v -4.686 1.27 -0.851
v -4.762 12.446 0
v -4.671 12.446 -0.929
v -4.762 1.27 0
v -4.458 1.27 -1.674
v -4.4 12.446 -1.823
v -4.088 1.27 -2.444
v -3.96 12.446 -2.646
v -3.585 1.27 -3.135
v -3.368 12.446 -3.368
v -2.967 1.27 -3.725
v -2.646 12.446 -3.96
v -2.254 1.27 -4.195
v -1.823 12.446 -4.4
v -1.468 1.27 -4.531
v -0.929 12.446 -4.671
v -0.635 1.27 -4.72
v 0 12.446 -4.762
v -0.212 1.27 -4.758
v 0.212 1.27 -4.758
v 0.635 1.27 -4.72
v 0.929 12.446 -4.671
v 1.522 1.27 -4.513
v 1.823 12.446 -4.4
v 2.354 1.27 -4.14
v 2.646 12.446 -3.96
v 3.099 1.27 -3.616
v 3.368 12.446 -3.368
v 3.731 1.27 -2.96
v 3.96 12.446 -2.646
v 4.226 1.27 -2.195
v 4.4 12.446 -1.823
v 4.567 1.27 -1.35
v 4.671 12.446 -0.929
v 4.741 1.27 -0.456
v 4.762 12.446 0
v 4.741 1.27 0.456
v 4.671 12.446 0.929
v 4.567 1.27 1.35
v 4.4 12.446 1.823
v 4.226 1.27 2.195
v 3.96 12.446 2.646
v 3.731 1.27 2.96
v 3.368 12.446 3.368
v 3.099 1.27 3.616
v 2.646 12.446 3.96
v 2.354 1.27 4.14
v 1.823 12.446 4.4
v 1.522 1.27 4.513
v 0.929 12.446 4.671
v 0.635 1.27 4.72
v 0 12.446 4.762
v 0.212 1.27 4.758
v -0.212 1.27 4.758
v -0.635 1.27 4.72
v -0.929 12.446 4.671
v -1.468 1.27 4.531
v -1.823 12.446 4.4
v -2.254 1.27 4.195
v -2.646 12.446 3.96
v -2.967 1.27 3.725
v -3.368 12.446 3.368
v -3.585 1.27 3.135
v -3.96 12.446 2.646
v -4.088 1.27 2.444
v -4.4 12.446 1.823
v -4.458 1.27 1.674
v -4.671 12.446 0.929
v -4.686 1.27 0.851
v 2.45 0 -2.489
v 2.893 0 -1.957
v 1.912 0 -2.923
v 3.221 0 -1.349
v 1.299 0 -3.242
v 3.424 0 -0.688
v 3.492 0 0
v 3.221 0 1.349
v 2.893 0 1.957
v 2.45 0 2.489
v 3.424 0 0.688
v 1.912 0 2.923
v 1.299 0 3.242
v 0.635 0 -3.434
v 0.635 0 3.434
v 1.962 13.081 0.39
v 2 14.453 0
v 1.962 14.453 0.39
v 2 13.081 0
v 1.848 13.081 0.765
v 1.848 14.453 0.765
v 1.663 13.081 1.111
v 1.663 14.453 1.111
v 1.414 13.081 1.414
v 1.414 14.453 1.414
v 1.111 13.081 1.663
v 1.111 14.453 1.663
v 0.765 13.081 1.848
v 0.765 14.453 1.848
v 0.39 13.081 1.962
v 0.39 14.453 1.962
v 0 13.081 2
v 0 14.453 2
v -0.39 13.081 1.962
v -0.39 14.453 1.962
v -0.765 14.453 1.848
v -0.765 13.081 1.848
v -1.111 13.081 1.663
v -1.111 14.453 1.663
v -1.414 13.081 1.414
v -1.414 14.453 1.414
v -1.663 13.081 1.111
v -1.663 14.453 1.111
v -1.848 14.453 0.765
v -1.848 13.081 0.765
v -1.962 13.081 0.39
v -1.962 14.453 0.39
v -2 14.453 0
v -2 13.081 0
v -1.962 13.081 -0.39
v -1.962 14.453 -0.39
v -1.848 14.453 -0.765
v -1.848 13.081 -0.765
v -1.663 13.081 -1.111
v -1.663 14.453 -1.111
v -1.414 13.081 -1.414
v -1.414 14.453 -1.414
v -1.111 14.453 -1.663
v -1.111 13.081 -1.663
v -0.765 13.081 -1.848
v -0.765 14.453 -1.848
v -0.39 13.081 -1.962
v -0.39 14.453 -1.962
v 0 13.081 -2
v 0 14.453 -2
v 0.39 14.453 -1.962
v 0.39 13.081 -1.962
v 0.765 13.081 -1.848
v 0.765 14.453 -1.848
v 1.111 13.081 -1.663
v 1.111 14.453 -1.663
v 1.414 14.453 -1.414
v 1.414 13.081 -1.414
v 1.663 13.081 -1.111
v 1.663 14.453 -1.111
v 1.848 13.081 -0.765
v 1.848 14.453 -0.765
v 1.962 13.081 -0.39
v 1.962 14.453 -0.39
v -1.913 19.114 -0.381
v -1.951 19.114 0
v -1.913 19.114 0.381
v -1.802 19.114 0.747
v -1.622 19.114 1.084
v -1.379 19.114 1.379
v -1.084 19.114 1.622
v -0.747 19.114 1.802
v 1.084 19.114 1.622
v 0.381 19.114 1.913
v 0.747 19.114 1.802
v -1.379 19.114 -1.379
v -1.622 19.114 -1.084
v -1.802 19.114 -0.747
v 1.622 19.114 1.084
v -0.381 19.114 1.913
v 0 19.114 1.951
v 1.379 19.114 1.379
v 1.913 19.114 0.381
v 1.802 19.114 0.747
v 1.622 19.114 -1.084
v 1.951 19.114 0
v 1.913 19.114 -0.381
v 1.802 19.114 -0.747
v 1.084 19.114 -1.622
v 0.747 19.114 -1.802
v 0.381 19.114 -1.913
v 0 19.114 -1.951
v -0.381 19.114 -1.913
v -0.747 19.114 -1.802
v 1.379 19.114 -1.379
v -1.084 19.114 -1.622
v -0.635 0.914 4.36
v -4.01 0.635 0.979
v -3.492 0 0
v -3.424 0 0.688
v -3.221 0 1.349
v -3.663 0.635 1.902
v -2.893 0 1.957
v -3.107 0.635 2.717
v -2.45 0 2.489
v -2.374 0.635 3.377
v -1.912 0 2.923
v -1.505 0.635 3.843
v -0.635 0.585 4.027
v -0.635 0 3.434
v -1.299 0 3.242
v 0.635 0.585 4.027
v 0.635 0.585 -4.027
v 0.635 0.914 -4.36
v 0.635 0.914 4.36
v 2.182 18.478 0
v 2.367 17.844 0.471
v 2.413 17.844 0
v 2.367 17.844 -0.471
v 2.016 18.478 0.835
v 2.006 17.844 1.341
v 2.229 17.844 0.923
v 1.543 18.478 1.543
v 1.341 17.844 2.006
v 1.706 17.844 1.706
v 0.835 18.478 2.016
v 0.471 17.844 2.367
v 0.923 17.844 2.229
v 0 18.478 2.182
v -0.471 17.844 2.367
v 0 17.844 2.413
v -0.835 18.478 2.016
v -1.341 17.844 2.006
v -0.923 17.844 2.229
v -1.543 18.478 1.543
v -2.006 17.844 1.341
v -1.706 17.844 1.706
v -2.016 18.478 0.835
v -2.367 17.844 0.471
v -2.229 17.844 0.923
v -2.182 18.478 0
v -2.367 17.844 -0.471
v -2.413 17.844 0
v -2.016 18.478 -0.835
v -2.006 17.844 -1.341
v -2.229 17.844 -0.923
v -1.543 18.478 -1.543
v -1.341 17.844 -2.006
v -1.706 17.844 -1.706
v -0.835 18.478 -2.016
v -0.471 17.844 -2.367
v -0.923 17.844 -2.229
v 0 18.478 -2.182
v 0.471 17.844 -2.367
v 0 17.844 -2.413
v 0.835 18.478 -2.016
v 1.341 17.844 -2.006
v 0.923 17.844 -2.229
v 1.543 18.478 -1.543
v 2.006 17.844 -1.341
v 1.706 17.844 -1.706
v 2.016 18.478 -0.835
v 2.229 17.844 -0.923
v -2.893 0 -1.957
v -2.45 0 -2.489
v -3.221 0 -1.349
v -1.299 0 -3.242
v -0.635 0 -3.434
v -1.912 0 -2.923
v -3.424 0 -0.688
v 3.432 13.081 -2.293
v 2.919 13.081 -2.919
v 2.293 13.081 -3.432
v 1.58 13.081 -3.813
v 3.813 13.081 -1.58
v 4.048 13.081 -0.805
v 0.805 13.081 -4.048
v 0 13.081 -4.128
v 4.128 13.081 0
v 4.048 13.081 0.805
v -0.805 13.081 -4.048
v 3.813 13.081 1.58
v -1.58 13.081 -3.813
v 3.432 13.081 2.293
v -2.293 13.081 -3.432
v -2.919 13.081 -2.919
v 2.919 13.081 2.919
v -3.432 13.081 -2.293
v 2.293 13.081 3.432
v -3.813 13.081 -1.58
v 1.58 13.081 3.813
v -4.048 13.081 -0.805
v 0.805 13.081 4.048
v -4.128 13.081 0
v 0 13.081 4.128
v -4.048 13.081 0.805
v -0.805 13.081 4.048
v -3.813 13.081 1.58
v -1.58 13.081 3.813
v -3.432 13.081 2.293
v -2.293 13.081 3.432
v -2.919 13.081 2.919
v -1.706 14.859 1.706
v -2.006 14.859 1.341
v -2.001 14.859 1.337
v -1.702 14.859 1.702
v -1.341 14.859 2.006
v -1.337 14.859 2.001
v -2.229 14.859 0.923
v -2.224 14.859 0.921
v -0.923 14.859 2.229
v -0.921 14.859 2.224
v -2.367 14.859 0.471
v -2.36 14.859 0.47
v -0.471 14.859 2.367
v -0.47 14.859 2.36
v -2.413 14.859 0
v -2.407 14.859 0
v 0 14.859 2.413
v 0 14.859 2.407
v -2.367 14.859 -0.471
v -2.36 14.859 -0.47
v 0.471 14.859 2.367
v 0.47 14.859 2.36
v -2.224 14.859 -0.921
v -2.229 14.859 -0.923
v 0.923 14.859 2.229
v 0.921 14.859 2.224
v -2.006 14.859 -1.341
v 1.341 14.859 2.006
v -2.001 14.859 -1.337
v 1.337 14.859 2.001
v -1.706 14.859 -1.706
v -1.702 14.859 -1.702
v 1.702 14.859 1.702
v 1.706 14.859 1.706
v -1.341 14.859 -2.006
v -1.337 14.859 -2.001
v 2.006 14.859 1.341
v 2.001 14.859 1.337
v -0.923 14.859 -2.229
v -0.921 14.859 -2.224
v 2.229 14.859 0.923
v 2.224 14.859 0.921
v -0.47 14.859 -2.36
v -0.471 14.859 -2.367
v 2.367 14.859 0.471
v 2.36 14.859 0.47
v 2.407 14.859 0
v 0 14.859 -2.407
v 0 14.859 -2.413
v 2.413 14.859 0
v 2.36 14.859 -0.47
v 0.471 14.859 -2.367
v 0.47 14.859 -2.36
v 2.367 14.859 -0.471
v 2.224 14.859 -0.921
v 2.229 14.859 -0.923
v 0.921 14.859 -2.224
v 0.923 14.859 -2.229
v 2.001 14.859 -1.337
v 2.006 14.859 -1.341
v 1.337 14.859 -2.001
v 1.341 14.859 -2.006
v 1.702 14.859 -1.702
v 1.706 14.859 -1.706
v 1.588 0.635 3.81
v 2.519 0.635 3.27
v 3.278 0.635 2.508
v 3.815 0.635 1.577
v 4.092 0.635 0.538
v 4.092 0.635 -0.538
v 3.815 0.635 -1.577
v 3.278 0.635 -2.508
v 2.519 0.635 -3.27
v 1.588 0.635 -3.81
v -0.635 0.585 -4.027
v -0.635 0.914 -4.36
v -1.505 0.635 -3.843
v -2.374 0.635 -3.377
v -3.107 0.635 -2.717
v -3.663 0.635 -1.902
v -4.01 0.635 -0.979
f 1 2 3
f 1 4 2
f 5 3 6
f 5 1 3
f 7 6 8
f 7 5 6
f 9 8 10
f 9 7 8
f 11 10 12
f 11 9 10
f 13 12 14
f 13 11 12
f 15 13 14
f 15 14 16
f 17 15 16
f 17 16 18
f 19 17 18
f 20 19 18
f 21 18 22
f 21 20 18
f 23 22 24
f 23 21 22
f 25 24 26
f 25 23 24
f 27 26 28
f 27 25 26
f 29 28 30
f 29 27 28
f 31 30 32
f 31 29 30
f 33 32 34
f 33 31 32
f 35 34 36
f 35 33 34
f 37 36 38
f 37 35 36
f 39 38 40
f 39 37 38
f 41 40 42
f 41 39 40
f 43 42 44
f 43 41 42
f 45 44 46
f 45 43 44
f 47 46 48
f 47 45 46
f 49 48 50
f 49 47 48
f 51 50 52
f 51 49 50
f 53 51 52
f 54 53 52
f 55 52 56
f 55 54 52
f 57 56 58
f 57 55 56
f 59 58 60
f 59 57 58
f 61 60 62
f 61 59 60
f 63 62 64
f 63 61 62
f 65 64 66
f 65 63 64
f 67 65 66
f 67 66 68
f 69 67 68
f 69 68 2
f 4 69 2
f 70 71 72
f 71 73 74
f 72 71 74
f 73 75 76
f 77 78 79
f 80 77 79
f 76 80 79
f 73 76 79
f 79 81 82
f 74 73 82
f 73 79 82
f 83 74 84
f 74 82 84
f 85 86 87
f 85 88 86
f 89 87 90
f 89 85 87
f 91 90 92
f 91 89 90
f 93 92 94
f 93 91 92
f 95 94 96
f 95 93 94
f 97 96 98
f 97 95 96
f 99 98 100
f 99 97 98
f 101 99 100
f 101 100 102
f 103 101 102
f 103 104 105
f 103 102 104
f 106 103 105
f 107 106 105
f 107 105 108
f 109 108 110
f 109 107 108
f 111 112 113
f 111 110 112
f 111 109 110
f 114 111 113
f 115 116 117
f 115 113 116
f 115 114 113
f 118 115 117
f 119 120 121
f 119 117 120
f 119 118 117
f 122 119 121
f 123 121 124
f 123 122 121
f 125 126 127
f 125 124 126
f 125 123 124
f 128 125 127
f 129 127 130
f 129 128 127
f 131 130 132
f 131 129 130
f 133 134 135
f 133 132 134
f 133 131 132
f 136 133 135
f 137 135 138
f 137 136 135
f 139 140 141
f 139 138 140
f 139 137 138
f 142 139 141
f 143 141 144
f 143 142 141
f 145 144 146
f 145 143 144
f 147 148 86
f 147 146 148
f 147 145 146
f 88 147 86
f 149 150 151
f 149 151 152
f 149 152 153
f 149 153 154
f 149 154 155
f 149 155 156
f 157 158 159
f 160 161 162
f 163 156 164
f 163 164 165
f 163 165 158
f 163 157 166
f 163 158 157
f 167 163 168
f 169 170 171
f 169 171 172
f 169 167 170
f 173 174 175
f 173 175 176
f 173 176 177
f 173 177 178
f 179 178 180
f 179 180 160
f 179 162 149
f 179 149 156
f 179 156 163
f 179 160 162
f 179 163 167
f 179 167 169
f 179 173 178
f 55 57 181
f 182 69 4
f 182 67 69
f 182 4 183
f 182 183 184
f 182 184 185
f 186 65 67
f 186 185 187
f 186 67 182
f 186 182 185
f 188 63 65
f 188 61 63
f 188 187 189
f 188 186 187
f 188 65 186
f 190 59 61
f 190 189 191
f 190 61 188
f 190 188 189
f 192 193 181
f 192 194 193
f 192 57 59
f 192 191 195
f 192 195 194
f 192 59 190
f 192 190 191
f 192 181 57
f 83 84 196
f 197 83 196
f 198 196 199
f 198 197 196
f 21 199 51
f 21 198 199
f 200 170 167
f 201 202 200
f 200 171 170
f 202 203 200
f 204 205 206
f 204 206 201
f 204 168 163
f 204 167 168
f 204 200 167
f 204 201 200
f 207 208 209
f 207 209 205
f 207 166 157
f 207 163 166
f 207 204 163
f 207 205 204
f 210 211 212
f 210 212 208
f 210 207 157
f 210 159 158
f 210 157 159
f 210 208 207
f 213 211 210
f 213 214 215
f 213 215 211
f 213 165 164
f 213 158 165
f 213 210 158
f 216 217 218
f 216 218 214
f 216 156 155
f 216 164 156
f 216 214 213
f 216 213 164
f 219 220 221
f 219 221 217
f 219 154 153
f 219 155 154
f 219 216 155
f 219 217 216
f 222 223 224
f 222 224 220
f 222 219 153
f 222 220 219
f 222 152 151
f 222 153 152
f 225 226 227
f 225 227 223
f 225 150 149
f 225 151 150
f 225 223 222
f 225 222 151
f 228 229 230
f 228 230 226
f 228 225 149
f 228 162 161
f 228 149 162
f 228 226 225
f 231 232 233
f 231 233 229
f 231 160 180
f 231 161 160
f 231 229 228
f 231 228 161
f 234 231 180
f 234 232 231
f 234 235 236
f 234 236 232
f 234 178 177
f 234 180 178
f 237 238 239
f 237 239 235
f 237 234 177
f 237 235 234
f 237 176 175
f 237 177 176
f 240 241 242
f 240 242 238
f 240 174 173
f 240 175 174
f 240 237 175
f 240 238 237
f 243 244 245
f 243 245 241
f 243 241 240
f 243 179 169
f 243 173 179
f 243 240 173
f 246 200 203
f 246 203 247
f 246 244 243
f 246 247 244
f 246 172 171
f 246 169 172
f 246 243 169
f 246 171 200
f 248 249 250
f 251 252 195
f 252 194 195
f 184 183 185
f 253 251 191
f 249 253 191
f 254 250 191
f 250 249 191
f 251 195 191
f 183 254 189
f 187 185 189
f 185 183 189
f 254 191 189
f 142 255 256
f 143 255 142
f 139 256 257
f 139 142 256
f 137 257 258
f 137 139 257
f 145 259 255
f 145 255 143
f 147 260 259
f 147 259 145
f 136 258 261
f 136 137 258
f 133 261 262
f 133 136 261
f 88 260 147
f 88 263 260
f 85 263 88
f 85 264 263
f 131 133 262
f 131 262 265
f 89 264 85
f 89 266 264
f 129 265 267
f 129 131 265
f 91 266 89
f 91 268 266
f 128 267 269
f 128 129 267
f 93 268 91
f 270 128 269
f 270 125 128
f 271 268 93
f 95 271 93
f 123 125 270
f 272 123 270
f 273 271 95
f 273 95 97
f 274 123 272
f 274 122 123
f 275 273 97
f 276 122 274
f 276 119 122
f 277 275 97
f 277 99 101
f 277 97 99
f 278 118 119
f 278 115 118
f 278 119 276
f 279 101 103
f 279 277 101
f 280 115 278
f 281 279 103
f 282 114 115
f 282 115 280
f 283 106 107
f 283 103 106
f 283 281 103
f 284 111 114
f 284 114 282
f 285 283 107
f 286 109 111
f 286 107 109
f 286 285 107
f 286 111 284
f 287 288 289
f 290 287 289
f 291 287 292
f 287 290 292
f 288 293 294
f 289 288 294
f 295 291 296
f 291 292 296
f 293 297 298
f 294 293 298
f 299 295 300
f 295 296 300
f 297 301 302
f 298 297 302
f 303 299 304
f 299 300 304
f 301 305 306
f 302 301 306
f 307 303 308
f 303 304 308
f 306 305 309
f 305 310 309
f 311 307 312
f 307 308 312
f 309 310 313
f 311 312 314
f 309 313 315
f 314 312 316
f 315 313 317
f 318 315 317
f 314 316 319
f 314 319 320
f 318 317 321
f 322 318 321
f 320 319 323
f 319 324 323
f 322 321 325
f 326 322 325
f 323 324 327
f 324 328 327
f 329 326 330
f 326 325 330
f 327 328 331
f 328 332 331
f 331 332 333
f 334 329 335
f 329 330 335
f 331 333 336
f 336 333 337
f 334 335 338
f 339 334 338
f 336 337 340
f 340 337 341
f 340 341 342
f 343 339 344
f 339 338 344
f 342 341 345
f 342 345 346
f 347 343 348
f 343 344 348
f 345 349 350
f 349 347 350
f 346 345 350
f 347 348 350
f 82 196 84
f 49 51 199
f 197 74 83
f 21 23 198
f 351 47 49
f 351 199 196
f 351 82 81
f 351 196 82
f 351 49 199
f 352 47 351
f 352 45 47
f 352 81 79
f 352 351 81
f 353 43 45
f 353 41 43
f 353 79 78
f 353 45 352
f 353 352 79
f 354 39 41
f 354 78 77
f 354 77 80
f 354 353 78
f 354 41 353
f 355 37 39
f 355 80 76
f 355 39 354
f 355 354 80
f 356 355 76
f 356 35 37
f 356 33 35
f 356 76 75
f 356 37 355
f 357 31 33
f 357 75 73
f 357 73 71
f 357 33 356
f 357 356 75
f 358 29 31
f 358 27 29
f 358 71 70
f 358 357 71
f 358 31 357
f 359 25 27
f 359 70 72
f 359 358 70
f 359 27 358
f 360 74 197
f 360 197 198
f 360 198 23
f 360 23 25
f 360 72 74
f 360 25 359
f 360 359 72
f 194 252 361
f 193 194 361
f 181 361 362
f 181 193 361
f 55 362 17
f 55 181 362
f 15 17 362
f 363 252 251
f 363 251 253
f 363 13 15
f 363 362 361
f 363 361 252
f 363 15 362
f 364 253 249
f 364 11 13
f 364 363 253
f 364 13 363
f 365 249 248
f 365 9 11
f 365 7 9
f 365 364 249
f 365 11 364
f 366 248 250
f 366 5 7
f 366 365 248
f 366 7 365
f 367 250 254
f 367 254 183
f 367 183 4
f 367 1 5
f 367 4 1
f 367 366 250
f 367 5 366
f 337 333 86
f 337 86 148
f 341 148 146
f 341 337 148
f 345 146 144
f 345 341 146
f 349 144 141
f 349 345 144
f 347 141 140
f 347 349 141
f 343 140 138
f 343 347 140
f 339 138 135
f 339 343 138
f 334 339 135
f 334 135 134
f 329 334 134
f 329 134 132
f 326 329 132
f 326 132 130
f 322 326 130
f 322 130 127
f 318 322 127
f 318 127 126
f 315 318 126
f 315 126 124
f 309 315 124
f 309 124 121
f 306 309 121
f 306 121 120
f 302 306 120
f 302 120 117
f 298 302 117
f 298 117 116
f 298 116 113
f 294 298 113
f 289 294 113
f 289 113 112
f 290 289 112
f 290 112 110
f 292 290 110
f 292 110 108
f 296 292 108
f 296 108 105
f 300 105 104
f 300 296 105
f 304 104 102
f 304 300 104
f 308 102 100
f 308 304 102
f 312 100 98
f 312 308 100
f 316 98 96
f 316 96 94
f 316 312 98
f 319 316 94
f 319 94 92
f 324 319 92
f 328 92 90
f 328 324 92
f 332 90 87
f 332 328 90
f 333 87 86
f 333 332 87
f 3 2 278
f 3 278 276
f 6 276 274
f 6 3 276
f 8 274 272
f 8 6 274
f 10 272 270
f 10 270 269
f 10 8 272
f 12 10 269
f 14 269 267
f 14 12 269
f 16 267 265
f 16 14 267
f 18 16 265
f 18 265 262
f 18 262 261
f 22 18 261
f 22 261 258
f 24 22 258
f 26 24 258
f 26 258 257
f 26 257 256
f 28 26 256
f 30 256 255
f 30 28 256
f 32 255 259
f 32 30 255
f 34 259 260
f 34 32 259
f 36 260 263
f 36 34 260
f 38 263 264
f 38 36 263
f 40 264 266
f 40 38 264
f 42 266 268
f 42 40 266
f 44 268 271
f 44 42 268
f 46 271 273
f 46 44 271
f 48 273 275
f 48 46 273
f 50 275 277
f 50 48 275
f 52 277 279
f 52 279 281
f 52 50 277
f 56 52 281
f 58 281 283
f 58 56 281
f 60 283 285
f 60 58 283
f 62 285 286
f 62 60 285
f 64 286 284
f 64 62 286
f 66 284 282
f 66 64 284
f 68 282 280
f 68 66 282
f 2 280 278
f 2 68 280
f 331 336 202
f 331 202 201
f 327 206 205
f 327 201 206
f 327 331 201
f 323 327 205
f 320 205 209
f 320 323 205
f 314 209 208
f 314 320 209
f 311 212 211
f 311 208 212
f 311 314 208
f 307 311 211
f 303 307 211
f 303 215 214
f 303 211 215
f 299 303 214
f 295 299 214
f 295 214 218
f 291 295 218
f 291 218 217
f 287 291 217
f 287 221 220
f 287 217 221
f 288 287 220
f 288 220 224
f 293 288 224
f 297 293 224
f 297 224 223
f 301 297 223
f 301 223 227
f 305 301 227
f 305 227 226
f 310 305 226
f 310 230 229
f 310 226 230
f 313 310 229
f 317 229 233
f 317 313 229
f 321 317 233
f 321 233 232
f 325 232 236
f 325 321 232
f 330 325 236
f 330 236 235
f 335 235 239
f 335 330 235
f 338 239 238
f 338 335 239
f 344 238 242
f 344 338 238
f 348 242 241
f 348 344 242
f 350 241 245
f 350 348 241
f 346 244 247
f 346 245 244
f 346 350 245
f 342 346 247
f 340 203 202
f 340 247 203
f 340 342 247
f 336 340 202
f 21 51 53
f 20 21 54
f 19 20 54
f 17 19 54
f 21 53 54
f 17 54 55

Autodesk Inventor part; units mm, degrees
ref_plane "YZ Plane" through (0, 0, 0) normal (1, 0, 0) x (0, 1, 0)
ref_plane "XZ Plane" through (0, 0, 0) normal (0, 1, 0) x (-1, 0, 0)
ref_plane "XY Plane" through (0, 0, 0) normal (0, 0, 1) x (1, 0, 0)
sketch "Sketch1" plane through (0, 0, 0) normal (0, 1, 0) x (-1, 0, 0)
  circle A0 centre (0, 0) radius 4.7625
  line L0 (0.635, 4.7625) -> (-0.635, 4.7625)
  line L1 (-0.635, 4.7625) -> (-0.635, -4.7625)
  line L2 (-0.635, -4.7625) -> (0.635, -4.7625)
  line L3 (0.635, -4.7625) -> (0.635, 4.7625)
  line L4 (0.635, 4.7625) -> (-0.635, -4.7625) construction
  line L5 (-0.635, 4.7625) -> (0.635, -4.7625) construction
  point P0 (0.635, -4.72)
  point P1 (0.635, 4.72)
  point P2 (-0.635, 4.72)
  point P3 (-0.635, -4.72)
  dimension "d0" = 9.525
  dimension "d9" = 1.27
extrude "Extrusion1" add sketch "Sketch1" along normal blind 13.081 contours A0 L3 | L3 A0 L1 | L1 A0
sketch "Sketch2" plane through (0, 13.081, 0) normal (0, 1, 0) x (1, 0, 0)
  circle A0 centre (0, 0) radius 2.0003
  dimension "d3" = 4.0005
extrude "Extrusion2" add sketch "Sketch2" along normal blind 1.778
sketch "Sketch3" plane through (0, 14.859, 0) normal (0, 1, 0) x (1, 0, 0)
  circle A0 centre (0, 0) radius 2.413
  dimension "d19" = 4.826
extrude "Extrusion4" add sketch "Sketch3" along normal blind 4.2545
extrude "Extrusion3" cut sketch "Sketch1" along normal blind 1.27 contours L3 A0 L1
chamfer "Chamfer2" distance 0.635 angle 45 1 edges at (4.7625, 13.081, 0)
chamfer "Chamfer1" distance 1.27 angle 45 3 edges at (-3.5851, 0, -3.1351) (-3.5851, 0, 3.1351) (4.7625, 0, 0)
chamfer "Chamfer3" distance 0.4064 angle 45 1 edges at (-2.0003, 14.859, 0)
chamfer "Chamfer4" distance 1.27 angle 20 1 edges at (-2.413, 19.1135, 0) measured on face at (2.4052, 17.6953, 0.1942)
thread "Thread3" size "10-48 UNS" class "2A" standard "ANSI Unified Screw Threads" length 6.0325
properties part number "0.375 Shaft" material "Stainless Steel"
